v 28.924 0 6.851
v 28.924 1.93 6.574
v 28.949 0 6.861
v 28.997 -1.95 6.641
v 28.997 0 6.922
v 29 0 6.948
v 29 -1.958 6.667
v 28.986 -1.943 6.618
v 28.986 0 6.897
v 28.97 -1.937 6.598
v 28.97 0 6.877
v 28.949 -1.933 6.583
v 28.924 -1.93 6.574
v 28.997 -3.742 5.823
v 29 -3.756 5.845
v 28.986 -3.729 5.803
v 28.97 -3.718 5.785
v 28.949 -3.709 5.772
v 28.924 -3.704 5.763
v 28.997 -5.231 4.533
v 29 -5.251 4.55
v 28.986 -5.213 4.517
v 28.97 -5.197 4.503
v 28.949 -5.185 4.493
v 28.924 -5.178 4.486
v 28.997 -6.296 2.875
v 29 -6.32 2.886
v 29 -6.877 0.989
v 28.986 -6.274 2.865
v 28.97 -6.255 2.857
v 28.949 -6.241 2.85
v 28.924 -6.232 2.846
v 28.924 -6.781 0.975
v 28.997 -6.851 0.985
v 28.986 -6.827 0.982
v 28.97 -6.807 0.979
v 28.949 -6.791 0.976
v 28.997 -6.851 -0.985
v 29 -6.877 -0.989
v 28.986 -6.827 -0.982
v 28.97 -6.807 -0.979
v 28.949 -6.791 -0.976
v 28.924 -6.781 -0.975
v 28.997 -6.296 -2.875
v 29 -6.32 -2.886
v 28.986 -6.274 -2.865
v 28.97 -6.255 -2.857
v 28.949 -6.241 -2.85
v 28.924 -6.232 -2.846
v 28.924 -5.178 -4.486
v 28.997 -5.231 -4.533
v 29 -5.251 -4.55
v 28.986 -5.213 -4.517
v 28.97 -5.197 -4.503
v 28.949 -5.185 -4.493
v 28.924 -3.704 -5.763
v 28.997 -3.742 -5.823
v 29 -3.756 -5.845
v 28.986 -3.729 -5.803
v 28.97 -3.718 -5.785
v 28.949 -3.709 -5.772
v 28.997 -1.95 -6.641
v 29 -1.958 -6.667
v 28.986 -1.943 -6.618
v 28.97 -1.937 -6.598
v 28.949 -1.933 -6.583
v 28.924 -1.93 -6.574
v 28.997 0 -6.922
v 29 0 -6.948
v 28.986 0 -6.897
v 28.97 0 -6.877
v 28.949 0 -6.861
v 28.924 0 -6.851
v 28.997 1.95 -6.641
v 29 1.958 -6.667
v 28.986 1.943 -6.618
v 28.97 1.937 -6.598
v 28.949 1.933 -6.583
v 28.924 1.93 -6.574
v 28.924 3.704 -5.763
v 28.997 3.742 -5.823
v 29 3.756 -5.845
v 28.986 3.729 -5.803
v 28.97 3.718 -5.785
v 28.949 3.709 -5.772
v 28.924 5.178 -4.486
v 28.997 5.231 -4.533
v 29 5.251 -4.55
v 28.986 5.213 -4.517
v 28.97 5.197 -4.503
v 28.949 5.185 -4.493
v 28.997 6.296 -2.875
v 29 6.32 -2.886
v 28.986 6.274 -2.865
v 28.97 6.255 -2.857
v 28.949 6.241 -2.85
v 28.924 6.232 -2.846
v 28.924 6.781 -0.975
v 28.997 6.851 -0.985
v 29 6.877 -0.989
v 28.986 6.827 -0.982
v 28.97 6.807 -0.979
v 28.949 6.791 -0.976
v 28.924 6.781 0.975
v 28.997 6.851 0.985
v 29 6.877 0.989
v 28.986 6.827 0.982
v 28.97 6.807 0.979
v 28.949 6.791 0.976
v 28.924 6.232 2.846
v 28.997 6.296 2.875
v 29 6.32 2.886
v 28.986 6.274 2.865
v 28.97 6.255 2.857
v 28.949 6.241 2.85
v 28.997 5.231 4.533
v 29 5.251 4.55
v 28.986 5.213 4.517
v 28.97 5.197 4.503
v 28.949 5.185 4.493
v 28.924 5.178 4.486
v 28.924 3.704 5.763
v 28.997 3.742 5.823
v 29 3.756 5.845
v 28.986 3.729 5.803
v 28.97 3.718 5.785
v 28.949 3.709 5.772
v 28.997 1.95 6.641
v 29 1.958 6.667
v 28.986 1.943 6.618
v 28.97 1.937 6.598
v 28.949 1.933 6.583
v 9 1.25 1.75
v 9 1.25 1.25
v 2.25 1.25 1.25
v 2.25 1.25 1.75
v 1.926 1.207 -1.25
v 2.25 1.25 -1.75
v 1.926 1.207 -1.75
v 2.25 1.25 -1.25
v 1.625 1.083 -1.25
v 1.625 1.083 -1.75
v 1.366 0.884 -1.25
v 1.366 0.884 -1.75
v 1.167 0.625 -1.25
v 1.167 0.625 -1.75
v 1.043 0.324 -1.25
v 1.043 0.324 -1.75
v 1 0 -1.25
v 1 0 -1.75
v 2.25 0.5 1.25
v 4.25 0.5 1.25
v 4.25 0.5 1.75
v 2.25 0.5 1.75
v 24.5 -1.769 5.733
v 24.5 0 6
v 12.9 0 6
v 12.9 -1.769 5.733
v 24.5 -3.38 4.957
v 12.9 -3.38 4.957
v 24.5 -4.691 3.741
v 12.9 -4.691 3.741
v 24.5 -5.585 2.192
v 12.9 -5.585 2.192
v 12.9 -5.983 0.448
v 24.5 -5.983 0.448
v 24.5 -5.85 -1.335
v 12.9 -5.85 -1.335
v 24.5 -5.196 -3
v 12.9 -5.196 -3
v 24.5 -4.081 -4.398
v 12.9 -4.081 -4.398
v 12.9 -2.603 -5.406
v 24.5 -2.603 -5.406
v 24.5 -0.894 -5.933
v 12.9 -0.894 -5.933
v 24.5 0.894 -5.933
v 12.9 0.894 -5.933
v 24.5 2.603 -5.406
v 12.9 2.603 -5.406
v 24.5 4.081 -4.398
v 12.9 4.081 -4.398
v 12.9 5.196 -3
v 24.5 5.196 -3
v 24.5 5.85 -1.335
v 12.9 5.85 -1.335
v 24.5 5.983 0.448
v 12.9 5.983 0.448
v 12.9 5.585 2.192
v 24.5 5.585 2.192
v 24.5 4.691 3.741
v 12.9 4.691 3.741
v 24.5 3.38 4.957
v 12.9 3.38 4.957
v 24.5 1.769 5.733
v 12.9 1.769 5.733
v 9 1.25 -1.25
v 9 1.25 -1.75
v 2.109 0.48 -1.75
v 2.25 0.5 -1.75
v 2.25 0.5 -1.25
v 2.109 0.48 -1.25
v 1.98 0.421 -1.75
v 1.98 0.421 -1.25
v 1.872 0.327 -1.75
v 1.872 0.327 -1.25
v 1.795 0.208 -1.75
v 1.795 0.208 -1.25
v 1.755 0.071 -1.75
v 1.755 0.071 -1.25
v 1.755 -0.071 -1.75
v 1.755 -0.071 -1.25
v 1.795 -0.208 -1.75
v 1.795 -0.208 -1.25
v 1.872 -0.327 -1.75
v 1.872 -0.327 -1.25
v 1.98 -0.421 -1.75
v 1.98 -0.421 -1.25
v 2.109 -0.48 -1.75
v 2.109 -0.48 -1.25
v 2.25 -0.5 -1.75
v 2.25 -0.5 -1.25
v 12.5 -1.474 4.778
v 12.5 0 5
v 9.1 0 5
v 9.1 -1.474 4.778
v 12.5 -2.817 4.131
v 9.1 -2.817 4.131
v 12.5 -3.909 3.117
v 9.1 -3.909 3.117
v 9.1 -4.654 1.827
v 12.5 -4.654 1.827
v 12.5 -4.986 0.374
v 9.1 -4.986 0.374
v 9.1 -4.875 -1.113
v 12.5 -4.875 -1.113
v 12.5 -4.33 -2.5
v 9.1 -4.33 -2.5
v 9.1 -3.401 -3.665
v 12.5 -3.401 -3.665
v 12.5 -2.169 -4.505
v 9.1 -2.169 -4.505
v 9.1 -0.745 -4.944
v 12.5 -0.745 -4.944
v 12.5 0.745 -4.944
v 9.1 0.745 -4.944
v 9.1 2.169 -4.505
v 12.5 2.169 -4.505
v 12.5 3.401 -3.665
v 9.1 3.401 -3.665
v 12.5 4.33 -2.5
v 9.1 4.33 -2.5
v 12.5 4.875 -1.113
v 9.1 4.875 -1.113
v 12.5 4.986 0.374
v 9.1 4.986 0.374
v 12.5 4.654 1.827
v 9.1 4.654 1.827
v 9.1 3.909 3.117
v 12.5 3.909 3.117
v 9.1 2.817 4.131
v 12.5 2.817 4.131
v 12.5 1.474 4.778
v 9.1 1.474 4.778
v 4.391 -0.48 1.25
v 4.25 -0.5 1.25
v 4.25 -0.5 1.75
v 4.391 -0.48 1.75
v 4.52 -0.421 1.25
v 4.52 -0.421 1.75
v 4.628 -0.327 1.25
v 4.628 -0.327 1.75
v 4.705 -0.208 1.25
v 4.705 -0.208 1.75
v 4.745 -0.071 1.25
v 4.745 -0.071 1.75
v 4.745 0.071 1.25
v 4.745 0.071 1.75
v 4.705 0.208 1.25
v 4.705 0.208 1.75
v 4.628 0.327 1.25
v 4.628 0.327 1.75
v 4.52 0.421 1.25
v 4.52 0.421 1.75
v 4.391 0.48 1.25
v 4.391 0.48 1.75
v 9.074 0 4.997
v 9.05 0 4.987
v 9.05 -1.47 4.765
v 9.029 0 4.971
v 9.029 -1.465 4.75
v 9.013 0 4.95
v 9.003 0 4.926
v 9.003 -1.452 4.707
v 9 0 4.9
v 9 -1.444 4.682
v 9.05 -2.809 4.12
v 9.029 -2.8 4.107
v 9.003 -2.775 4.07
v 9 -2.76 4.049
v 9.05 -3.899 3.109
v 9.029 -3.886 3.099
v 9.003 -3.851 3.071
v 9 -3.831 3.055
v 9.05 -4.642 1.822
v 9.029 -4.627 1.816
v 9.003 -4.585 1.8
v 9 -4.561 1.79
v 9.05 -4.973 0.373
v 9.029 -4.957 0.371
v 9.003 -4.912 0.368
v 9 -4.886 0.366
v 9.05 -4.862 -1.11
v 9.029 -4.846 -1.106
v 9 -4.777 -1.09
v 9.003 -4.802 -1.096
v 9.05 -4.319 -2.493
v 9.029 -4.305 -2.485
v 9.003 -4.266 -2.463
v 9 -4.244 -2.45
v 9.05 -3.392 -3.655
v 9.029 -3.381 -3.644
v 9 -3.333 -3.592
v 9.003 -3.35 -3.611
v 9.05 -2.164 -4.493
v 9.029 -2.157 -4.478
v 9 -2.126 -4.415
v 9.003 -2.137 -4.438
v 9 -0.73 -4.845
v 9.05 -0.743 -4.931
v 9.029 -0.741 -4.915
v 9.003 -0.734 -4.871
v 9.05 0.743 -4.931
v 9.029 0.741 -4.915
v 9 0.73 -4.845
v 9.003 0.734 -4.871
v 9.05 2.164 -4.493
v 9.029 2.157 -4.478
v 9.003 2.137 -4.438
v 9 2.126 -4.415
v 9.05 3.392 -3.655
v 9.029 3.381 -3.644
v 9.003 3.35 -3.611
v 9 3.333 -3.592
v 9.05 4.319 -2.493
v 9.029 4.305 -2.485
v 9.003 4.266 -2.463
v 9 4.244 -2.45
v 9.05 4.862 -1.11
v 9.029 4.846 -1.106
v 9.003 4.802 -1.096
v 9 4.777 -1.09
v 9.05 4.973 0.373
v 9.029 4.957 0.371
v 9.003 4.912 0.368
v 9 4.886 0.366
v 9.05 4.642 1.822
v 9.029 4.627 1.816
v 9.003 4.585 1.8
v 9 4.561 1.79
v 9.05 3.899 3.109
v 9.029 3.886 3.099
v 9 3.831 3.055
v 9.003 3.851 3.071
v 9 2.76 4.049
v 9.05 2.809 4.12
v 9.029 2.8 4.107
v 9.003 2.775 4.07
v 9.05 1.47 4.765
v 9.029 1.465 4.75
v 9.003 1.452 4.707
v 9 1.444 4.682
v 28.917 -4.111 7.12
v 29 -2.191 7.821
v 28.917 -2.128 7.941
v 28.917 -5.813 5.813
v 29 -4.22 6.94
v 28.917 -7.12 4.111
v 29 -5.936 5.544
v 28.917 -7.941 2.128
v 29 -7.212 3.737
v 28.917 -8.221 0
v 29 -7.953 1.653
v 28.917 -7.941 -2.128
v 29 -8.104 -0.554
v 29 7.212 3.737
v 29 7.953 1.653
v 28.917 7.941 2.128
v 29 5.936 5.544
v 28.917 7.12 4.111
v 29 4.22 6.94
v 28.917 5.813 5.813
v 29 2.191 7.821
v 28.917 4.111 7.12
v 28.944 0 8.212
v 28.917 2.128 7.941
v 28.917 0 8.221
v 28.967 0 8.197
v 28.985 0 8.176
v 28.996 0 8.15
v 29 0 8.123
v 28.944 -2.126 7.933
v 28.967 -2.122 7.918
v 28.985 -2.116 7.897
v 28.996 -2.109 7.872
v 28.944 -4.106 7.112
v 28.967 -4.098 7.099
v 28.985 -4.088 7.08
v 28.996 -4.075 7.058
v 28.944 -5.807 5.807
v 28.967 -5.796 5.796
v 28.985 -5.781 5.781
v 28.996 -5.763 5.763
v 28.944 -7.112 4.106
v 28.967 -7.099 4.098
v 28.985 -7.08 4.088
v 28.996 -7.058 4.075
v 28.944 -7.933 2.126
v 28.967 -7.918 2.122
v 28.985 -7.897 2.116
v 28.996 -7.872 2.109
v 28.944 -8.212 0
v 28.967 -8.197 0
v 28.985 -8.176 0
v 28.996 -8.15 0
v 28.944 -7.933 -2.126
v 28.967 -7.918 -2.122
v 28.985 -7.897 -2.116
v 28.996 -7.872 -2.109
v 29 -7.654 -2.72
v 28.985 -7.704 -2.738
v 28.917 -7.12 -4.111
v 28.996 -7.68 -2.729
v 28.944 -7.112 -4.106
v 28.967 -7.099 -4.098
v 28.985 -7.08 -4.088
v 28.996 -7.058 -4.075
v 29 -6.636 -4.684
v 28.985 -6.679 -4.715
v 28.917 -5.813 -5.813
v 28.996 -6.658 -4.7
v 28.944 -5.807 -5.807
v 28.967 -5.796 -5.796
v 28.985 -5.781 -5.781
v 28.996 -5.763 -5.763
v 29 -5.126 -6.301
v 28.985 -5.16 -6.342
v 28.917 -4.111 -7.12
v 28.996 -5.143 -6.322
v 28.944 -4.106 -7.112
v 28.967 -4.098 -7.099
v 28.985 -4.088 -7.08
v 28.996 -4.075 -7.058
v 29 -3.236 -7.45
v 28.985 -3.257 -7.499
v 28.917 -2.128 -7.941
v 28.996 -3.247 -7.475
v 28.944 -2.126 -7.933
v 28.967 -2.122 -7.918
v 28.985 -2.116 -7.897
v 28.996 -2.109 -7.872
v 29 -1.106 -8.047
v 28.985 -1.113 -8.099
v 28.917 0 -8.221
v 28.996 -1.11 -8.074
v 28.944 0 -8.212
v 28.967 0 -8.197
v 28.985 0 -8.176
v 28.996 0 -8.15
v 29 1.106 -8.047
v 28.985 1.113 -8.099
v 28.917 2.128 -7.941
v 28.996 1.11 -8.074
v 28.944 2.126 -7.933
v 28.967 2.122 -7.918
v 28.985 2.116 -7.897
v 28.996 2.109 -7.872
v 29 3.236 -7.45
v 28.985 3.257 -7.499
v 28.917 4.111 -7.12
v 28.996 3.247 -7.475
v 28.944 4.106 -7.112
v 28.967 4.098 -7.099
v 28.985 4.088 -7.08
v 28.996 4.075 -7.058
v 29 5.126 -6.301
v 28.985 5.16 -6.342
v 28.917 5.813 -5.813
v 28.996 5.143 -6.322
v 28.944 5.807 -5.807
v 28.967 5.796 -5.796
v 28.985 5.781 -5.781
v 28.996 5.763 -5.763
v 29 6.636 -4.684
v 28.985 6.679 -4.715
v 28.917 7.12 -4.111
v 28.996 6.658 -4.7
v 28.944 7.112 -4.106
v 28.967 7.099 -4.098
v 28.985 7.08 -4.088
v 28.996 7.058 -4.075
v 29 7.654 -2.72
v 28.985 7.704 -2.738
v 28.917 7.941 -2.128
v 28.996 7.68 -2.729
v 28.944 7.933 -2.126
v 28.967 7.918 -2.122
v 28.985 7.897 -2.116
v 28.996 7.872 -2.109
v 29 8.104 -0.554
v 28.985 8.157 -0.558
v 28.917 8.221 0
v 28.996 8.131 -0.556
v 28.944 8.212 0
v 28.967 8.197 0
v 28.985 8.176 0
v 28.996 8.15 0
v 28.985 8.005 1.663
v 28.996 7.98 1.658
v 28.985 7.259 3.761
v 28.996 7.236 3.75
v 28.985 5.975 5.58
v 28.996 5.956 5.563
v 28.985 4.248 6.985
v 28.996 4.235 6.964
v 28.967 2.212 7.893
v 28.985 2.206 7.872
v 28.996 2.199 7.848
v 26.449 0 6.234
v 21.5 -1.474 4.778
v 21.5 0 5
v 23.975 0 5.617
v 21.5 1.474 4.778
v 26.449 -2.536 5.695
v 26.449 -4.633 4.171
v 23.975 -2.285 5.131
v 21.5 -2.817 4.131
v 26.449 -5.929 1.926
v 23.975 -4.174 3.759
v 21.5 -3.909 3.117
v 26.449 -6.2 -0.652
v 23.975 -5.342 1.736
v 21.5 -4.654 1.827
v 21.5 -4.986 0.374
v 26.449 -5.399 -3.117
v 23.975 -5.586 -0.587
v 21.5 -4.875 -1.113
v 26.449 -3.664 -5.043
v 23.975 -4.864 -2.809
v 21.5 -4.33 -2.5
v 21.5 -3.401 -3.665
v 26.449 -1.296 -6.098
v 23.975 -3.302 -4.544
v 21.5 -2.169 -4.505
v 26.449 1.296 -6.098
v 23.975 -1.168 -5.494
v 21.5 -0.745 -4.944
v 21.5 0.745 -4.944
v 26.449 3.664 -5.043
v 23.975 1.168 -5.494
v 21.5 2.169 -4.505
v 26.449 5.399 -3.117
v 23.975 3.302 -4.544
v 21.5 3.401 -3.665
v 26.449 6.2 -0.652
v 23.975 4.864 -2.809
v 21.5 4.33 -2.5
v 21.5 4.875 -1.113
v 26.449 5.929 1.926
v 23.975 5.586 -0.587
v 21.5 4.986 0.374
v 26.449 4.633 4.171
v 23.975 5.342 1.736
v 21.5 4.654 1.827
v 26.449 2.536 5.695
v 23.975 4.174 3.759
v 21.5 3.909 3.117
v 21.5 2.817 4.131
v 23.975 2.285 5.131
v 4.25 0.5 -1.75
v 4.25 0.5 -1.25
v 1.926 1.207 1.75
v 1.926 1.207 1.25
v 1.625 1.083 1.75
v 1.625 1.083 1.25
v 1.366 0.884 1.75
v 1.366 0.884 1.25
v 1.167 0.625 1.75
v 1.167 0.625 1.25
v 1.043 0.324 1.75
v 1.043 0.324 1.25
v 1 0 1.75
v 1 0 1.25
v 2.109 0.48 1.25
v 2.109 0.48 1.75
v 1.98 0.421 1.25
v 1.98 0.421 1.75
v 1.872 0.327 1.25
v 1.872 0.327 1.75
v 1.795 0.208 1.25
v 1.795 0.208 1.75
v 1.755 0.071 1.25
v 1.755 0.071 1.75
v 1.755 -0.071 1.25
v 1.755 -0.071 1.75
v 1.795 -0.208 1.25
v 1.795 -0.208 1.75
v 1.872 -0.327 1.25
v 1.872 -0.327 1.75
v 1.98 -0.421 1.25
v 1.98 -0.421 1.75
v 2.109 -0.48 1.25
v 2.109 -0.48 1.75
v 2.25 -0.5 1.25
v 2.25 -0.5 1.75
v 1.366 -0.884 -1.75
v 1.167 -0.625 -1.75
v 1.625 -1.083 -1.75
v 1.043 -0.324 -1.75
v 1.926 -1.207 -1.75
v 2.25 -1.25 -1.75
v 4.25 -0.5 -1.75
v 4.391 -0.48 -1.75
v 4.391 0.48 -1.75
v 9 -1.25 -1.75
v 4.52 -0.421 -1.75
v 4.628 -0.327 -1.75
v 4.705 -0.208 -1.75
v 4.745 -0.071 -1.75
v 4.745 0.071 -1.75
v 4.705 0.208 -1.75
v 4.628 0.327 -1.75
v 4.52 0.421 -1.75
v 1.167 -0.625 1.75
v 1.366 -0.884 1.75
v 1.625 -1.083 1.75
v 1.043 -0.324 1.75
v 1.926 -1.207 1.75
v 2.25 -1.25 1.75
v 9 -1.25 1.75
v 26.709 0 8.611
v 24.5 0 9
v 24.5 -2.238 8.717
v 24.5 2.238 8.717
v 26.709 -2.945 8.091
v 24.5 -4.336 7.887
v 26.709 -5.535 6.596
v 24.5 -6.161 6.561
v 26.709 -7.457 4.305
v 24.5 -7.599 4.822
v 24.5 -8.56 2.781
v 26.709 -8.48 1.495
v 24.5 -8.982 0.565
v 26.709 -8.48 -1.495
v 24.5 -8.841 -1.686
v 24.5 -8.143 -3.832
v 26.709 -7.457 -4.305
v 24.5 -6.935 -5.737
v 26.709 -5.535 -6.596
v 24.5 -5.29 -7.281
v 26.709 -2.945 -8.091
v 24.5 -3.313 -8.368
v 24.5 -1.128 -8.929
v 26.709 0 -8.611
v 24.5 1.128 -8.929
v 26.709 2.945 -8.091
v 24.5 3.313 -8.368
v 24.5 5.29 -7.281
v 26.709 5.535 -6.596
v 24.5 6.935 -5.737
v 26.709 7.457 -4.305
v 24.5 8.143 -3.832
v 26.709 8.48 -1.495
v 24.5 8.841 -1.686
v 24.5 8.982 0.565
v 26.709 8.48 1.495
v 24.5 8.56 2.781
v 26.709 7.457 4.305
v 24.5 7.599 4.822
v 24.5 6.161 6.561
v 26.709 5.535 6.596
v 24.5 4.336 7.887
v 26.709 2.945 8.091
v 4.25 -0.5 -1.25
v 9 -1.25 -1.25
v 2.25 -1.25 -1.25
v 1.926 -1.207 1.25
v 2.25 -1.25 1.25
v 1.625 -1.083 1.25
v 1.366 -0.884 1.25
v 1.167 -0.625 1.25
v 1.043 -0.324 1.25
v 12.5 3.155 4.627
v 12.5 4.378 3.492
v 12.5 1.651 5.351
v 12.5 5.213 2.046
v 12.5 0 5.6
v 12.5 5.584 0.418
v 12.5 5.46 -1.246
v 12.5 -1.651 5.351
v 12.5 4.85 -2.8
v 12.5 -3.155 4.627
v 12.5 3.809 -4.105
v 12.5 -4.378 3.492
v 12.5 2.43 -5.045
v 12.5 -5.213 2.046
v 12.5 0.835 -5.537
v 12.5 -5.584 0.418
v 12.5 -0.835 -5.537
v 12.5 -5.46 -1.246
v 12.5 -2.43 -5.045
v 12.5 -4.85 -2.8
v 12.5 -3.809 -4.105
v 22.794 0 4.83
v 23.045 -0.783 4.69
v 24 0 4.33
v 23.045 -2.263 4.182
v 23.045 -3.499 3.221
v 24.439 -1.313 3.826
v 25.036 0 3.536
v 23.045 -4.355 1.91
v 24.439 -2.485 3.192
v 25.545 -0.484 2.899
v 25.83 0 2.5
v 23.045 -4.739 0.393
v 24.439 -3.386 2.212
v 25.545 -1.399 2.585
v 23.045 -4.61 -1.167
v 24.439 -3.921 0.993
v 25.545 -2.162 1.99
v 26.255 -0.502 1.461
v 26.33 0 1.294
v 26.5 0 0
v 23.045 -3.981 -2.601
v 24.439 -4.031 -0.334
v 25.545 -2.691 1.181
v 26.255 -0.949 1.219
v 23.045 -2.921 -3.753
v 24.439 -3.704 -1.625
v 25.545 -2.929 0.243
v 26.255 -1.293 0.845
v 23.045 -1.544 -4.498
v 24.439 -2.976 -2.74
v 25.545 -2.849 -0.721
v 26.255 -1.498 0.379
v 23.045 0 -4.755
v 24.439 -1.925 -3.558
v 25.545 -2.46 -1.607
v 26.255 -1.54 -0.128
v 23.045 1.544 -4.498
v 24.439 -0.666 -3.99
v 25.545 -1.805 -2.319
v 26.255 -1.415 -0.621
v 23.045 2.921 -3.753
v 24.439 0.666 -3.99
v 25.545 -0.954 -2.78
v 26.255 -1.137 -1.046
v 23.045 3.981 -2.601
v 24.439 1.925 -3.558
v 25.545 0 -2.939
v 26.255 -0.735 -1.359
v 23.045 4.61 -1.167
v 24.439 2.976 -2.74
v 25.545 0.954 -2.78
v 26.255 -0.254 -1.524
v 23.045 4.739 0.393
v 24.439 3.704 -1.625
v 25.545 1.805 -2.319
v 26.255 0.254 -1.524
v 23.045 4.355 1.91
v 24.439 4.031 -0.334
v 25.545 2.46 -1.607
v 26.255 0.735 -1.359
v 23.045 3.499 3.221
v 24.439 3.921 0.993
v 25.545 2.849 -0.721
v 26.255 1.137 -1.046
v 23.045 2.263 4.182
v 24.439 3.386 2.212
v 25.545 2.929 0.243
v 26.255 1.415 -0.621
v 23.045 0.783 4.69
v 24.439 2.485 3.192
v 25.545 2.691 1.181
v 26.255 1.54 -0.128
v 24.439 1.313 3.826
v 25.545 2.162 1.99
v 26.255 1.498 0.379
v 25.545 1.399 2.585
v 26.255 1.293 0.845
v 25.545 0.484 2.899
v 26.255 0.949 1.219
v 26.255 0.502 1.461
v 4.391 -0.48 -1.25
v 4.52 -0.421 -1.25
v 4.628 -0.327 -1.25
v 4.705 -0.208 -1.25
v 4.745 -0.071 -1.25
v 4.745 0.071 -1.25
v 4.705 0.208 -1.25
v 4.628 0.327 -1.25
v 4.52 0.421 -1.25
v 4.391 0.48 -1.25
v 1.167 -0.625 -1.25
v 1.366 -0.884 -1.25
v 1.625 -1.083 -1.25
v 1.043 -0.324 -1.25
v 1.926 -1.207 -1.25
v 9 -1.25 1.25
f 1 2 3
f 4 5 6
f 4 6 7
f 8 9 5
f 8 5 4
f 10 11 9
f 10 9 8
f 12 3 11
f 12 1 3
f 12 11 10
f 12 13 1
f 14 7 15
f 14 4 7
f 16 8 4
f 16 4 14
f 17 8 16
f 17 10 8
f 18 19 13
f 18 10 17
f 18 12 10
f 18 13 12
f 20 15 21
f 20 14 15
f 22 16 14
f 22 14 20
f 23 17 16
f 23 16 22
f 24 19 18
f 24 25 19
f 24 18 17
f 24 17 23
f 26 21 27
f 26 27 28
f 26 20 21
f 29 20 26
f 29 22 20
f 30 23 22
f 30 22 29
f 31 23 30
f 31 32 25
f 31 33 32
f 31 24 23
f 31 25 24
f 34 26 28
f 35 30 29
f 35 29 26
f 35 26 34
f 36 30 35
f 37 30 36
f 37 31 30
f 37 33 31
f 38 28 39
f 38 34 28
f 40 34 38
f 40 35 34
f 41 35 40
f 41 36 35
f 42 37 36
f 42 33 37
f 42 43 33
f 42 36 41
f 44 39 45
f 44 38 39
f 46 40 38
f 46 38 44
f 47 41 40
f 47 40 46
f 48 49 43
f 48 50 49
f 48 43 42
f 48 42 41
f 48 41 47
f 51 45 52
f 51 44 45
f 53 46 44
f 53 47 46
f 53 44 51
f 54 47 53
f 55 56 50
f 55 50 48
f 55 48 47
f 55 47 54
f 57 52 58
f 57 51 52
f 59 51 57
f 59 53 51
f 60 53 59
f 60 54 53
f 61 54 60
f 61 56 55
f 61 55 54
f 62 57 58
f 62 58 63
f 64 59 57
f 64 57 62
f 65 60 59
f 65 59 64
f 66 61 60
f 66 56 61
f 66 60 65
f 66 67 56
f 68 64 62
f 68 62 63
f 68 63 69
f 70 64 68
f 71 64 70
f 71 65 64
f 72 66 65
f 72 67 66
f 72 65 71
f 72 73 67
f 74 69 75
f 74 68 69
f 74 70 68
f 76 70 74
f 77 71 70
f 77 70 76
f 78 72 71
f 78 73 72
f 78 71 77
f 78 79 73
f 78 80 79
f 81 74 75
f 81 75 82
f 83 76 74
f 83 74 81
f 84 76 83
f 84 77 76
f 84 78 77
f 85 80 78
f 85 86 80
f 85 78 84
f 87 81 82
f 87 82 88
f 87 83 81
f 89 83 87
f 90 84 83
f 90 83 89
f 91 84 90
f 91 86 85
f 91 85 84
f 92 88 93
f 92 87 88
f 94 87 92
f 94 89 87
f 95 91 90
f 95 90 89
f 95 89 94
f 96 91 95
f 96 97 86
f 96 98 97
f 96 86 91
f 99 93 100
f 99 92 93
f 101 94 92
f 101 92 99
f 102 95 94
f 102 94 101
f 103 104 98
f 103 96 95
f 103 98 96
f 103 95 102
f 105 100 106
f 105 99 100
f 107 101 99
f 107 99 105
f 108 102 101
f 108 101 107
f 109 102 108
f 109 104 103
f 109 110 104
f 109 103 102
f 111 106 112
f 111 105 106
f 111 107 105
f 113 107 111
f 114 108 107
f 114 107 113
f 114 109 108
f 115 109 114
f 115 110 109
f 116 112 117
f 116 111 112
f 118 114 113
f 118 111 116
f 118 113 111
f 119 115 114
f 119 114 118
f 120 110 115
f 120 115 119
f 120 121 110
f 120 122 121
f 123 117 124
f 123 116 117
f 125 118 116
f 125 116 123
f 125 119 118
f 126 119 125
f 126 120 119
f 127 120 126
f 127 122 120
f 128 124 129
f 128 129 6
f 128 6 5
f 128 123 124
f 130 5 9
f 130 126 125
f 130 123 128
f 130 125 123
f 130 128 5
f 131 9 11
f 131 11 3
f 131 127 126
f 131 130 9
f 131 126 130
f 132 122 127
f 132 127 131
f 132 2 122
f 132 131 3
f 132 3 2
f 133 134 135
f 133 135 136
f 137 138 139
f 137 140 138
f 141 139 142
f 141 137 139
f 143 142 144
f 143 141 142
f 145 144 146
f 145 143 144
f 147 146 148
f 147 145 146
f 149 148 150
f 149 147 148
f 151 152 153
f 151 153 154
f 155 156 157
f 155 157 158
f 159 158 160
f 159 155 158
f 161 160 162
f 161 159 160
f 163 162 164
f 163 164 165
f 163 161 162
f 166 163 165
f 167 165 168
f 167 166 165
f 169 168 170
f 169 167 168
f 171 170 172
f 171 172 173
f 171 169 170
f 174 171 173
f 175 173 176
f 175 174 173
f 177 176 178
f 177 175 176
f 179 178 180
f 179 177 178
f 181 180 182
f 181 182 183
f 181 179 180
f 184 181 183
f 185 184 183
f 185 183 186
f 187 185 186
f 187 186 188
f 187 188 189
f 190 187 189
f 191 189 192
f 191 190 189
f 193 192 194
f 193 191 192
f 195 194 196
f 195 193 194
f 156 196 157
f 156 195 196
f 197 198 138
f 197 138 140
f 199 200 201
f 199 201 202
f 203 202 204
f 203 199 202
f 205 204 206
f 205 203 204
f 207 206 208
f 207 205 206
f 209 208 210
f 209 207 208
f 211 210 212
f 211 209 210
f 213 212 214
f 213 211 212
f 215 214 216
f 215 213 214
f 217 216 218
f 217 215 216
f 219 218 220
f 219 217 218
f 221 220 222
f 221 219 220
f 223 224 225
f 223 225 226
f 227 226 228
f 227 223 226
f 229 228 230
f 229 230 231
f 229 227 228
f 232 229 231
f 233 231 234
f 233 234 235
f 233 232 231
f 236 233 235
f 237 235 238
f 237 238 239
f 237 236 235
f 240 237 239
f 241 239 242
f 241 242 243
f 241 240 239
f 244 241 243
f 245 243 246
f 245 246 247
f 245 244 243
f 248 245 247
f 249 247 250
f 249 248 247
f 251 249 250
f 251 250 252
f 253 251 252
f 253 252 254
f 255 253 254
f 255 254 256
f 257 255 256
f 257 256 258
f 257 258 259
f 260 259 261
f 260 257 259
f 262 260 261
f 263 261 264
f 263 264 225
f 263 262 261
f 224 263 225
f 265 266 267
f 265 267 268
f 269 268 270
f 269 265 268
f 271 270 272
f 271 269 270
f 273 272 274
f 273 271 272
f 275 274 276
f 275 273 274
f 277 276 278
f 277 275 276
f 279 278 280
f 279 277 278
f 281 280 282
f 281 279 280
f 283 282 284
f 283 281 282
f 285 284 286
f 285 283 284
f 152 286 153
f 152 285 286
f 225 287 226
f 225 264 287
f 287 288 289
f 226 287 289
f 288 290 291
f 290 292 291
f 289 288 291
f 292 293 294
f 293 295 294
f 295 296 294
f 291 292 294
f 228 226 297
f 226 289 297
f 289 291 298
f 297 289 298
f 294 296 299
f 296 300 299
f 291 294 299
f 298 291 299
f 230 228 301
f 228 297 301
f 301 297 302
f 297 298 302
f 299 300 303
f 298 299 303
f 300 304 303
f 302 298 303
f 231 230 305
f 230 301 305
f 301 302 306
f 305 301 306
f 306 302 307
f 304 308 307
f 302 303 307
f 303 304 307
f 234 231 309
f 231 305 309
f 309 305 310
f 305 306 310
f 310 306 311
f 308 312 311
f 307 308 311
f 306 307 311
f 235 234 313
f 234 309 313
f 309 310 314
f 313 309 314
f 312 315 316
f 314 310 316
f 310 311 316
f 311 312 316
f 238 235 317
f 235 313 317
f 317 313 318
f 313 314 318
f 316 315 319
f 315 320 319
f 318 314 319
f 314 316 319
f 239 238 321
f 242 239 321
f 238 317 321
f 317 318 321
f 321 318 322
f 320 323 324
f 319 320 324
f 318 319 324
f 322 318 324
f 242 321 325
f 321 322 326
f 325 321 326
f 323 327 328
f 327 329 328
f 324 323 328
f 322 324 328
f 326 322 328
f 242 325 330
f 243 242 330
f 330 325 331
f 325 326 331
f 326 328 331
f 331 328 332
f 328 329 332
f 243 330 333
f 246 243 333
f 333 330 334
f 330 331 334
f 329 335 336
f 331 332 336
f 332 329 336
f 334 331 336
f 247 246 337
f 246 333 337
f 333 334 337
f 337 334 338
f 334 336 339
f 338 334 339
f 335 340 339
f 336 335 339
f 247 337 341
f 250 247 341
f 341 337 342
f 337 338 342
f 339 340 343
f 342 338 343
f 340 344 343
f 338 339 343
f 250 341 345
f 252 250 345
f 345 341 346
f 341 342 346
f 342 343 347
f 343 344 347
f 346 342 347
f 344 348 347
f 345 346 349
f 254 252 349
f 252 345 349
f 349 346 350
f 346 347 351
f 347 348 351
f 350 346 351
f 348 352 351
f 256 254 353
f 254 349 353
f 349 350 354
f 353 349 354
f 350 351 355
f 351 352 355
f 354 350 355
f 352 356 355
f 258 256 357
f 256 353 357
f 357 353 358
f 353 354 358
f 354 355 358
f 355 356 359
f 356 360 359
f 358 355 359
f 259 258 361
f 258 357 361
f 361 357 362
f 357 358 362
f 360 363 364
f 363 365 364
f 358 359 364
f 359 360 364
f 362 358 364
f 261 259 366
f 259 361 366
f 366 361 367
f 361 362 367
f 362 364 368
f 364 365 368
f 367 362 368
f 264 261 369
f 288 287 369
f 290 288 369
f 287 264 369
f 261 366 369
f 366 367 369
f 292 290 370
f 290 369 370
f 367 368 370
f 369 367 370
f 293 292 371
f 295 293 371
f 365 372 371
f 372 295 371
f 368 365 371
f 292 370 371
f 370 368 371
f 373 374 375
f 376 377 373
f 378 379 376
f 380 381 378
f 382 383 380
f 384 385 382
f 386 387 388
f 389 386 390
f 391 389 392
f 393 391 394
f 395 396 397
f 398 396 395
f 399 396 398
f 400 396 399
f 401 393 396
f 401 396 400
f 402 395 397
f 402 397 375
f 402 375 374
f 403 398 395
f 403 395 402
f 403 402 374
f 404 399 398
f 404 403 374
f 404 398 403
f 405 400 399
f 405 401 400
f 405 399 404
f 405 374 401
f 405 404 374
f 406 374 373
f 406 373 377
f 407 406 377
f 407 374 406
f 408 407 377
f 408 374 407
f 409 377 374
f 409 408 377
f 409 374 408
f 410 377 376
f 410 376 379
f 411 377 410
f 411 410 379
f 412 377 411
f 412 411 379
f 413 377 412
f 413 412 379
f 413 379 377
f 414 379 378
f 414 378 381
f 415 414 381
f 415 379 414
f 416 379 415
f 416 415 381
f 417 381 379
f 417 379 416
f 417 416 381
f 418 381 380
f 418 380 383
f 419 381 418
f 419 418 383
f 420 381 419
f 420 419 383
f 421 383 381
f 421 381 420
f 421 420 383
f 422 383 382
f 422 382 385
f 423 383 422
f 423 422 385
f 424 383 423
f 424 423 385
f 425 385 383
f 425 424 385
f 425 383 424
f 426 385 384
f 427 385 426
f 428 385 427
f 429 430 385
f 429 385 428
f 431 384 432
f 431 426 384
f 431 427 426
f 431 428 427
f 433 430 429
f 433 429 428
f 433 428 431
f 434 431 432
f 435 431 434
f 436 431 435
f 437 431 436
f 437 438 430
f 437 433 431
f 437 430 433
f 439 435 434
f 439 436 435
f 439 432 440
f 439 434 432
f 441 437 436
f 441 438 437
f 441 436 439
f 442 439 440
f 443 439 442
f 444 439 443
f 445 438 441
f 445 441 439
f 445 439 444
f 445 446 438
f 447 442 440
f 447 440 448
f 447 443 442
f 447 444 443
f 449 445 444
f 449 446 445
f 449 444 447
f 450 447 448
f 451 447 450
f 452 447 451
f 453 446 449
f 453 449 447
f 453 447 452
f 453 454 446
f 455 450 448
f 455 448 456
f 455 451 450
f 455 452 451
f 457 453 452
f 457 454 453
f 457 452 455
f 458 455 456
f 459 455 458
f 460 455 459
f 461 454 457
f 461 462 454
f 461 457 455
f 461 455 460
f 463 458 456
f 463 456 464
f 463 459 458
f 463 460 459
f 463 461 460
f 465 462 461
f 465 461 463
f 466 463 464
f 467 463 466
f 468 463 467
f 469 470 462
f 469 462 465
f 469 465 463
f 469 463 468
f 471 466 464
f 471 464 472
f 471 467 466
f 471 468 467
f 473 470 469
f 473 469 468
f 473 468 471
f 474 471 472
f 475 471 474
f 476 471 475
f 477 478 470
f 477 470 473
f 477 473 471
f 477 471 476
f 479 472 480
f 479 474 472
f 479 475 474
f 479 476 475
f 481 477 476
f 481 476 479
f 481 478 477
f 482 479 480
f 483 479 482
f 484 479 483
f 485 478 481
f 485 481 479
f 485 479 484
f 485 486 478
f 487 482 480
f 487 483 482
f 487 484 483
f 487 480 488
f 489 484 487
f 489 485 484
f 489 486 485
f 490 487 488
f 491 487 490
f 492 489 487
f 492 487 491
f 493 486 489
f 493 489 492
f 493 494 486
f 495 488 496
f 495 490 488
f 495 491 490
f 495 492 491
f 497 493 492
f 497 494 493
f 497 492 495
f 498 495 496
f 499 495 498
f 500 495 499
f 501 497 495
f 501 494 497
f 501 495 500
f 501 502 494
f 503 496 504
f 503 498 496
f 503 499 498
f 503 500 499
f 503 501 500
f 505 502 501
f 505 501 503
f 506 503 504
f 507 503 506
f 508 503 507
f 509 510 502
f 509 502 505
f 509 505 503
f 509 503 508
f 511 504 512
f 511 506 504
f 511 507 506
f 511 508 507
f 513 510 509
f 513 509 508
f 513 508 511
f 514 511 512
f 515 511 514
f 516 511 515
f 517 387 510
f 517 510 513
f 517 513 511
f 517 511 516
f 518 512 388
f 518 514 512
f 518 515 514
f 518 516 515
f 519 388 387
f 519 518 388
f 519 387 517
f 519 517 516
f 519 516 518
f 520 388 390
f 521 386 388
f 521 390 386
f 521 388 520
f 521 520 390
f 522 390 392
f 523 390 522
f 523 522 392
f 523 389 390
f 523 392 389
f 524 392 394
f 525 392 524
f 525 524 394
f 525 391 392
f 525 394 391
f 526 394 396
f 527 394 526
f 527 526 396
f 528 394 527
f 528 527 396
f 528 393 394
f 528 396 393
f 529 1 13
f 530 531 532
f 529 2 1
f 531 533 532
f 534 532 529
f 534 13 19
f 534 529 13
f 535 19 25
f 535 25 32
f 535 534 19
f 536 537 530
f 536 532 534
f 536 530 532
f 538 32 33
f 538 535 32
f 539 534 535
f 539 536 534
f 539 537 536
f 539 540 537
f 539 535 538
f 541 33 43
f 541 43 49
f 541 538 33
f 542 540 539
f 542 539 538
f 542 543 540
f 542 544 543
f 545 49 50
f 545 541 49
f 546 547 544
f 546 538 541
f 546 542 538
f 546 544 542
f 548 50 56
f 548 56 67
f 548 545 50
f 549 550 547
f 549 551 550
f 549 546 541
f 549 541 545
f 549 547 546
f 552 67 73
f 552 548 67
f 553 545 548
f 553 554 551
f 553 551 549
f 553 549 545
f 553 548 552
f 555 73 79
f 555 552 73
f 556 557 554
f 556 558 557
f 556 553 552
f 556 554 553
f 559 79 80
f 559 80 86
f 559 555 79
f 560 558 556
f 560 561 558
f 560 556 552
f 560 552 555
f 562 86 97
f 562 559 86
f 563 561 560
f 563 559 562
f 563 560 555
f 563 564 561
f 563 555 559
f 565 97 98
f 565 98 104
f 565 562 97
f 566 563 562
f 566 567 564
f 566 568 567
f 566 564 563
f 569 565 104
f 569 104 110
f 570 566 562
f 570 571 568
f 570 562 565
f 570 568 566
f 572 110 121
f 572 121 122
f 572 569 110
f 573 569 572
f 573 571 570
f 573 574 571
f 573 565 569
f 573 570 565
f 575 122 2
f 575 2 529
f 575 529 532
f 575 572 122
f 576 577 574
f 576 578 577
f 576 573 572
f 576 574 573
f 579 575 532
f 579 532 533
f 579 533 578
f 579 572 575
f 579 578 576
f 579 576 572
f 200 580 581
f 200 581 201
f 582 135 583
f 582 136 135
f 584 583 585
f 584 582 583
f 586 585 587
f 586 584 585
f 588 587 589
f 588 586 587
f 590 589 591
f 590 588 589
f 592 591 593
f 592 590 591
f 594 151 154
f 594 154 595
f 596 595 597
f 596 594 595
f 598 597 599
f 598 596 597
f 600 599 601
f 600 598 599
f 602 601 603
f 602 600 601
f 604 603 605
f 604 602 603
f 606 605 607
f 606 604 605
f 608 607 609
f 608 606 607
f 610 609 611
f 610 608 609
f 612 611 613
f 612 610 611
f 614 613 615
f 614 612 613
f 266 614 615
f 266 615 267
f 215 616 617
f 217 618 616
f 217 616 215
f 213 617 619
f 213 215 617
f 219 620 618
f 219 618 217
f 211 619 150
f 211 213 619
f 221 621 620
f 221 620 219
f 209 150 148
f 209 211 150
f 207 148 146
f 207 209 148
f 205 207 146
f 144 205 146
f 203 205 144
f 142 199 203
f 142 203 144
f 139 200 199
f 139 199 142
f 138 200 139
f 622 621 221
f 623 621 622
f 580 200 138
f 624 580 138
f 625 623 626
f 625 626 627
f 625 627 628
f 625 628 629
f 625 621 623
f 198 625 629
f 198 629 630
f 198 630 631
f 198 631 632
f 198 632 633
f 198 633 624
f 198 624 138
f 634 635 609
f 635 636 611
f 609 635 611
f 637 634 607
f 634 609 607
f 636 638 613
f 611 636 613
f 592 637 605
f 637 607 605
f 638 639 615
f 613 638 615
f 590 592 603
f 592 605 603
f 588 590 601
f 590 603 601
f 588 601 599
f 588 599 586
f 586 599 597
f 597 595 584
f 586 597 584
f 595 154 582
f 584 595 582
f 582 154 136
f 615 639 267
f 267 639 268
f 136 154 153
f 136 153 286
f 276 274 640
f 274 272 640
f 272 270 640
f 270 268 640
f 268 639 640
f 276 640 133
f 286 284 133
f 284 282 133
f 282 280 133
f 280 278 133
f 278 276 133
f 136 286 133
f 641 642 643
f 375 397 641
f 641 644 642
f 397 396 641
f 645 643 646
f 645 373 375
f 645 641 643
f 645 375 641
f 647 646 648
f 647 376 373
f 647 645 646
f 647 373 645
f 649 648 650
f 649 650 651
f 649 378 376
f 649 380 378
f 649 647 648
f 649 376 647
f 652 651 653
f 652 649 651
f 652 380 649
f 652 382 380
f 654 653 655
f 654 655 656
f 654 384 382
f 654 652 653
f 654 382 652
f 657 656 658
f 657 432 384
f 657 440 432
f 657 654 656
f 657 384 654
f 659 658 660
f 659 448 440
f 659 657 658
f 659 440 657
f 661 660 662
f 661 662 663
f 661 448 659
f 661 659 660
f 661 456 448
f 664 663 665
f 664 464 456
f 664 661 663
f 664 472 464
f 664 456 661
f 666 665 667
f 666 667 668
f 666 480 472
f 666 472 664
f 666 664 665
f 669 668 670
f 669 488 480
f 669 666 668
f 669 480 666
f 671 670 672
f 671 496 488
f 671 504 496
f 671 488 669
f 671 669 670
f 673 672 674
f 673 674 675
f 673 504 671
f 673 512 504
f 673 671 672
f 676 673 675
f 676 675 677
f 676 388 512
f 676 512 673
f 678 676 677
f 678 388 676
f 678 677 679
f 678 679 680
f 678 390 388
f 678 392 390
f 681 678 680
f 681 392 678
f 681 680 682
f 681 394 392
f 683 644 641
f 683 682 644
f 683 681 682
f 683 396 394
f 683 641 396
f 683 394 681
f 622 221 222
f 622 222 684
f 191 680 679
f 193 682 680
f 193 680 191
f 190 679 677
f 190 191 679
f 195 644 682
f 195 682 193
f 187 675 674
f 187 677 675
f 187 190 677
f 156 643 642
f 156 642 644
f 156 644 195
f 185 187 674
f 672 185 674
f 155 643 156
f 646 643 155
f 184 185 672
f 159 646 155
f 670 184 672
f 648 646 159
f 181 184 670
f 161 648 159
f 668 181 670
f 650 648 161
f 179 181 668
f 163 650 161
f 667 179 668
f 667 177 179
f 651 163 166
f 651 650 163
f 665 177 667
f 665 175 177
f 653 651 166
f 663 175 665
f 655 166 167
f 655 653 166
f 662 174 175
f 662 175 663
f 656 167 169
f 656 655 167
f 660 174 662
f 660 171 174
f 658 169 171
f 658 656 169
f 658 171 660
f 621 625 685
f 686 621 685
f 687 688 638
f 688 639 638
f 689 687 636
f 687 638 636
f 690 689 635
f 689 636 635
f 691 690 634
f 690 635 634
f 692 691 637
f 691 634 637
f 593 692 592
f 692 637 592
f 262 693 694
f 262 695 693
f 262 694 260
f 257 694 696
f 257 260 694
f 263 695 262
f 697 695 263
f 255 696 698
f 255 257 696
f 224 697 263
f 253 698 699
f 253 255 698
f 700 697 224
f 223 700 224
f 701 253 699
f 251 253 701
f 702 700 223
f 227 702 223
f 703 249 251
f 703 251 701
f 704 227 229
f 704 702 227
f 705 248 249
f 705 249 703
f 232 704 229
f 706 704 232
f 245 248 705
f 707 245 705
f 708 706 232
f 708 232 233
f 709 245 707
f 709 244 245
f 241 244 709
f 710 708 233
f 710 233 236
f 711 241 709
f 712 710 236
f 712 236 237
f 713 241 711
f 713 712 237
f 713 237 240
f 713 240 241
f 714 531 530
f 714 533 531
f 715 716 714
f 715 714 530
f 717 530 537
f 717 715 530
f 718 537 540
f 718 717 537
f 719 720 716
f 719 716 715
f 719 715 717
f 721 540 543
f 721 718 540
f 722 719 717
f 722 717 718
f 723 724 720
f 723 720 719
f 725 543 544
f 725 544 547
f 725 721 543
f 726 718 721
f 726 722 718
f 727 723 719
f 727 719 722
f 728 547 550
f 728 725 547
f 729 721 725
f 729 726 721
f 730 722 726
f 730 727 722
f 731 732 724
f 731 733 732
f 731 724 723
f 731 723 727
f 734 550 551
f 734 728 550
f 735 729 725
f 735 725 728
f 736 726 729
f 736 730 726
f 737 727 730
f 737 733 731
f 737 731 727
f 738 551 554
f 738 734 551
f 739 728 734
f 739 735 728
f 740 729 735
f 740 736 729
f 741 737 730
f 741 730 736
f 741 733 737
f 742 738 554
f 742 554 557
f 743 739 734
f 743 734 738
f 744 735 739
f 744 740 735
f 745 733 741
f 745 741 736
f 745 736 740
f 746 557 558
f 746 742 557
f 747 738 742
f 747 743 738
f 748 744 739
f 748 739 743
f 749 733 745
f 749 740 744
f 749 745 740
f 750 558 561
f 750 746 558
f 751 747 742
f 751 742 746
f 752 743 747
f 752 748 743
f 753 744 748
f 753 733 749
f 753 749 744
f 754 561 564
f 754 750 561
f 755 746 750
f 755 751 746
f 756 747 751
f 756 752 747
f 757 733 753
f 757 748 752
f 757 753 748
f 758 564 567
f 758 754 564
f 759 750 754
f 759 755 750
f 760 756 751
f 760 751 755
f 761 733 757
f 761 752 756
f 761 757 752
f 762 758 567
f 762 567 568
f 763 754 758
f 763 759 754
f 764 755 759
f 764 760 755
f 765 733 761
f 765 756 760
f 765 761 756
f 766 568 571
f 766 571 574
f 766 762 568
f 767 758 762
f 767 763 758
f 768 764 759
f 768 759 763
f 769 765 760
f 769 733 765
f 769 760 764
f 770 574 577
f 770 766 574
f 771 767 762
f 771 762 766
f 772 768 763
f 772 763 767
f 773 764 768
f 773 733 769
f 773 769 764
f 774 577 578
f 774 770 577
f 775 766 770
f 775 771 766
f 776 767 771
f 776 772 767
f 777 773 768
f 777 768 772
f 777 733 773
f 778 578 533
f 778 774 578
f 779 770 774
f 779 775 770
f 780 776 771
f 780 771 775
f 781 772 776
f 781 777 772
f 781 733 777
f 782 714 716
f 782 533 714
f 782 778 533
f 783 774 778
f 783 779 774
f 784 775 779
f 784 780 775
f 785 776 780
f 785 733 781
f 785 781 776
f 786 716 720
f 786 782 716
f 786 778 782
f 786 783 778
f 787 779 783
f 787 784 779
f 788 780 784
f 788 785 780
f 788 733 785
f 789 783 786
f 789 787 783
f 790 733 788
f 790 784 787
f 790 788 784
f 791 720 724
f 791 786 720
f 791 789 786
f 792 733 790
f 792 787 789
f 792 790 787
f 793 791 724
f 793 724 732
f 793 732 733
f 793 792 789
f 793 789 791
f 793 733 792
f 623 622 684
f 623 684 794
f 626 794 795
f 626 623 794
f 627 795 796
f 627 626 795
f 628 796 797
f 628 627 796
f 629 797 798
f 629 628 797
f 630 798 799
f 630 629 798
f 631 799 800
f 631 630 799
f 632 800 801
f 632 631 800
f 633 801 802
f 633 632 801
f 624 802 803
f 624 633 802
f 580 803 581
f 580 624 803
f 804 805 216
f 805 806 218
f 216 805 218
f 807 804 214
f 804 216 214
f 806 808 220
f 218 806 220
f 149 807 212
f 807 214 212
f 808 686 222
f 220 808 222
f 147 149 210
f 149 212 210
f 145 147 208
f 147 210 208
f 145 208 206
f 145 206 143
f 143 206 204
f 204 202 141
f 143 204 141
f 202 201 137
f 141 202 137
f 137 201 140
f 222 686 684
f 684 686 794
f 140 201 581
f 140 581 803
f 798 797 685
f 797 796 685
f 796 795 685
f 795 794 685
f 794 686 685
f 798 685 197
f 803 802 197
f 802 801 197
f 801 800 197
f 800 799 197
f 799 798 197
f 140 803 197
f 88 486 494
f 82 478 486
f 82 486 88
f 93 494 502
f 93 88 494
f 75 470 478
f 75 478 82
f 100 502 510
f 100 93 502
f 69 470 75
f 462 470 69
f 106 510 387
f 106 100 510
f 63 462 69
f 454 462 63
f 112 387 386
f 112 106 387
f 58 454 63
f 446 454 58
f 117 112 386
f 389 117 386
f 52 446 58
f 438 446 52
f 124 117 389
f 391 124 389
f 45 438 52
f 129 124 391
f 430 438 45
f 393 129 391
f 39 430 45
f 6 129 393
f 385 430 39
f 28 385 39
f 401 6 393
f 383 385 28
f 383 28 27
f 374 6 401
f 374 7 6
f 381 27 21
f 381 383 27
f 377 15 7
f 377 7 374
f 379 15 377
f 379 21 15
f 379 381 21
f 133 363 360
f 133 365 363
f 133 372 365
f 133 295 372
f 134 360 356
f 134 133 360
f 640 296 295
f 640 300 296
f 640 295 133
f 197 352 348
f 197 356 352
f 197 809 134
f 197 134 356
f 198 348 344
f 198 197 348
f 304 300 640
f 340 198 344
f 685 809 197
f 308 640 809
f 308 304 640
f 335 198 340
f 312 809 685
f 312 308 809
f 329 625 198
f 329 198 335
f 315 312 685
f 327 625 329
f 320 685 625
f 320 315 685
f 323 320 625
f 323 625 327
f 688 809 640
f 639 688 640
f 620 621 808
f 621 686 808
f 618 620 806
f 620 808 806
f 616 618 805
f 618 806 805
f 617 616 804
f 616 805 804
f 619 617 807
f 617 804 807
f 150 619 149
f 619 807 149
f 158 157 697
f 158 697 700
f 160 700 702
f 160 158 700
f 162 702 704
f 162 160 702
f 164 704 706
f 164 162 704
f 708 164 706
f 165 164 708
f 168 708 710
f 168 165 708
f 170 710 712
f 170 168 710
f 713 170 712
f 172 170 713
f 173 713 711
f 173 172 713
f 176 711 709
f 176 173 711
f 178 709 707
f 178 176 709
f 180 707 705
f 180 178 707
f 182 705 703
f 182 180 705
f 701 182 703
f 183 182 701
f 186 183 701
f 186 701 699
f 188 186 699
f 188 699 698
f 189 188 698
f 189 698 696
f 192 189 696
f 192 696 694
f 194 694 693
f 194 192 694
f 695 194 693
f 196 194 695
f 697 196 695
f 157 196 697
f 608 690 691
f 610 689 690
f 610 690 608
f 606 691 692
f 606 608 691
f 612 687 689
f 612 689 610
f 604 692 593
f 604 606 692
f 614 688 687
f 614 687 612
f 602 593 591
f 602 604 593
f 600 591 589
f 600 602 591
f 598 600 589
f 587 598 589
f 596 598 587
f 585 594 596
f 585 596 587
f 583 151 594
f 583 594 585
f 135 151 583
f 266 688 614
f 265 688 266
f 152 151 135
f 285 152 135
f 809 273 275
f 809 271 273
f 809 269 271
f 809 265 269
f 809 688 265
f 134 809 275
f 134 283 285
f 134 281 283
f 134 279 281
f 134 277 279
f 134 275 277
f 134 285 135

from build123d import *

# Parameters (mm, degrees)
CHAMFER_1_SIZE      = 0.4
FILLET_1_R          = 0.1
SKETCH_4_W          = 0.5
SKETCH_4_H          = 2.5
EXTRUDE_1_DEPTH     = 8
FILLET_2_R          = 1.25
CUT_EXTRUDE_1_DEPTH = 33.21121699


with BuildPart() as part:
    # Эскиз1 → Повернуть1 (revolve)
    with BuildSketch(Plane.XY, mode=Mode.PRIVATE) as revolve_1_sk:
        with BuildLine():
            Line((9, 0), (9, 5))
            Line((9, 5), (12.5, 5))
            Line((12.5, 5), (12.5, 6))
            Line((12.5, 6), (24.5, 6))
            Line((24.5, 6), (24.5, 9))
            Line((24.5, 9), (29, 8.206528587))
            Line((29, 8.206528587), (29, 6.869960021))
            Line((29, 6.869960021), (21.5, 5))
            ThreePointArc((21.5, 5), (25.035533906, 3.535533906), (26.5, 0))
            Line((26.5, 0), (9, 0))
        make_face()
    revolve(revolve_1_sk.sketch.rotate(Axis((9, 0, 0), (1, 0, 0)), 90), axis=Axis((9, 0, 0), (1, 0, 0)))

    # Фаска1
    chamfer_1_edges = [part.edges().sort_by_distance(p)[0] for p in [
        (12.5, 0, -6),
    ]]
    chamfer(chamfer_1_edges, length=CHAMFER_1_SIZE)

    # Скругление1
    fillet_1_edges = [part.edges().sort_by_distance(p)[0] for p in [
        (9, 0, -5),
        (29, 0, -6.869960021),
        (29, 0, -8.206528587),
    ]]
    fillet(fillet_1_edges, radius=FILLET_1_R)

    # Эскиз4 → Бобышка-Вытянуть1 (add)
    with BuildSketch(Plane.ZY.offset(-9)):
        with Locations((1.5, 0)):
            Rectangle(SKETCH_4_W, SKETCH_4_H)
        with Locations((-1.5, 0)):
            Rectangle(SKETCH_4_W, SKETCH_4_H)
    extrude(amount=EXTRUDE_1_DEPTH)

    # Скругление2
    fillet_2_edges = [part.edges().sort_by_distance(p)[0] for p in [
        (1, -1.25, 1.5),
        (1, -1.25, -1.5),
        (1, 1.25, 1.5),
        (1, 1.25, -1.5),
    ]]
    fillet(fillet_2_edges, radius=FILLET_2_R - 0.0001)  # a hair under: the kernel refuses the full size

    # Эскиз5 → Вырез-Вытянуть1 (cut, through all)
    with BuildSketch(Plane(origin=(0, 0, -1.75), x_dir=(-1, 0, 0), z_dir=(0, 0, -1))):
        with BuildLine():
            Line((-4.25, 0.5), (-2.25, 0.5))
            ThreePointArc((-2.25, 0.5), (-1.75, 0), (-2.25, -0.5))
            Line((-2.25, -0.5), (-4.25, -0.5))
            ThreePointArc((-4.25, -0.5), (-4.75, 0), (-4.25, 0.5))
        make_face()
    extrude(amount=-CUT_EXTRUDE_1_DEPTH, mode=Mode.SUBTRACT)


solid = part.part
